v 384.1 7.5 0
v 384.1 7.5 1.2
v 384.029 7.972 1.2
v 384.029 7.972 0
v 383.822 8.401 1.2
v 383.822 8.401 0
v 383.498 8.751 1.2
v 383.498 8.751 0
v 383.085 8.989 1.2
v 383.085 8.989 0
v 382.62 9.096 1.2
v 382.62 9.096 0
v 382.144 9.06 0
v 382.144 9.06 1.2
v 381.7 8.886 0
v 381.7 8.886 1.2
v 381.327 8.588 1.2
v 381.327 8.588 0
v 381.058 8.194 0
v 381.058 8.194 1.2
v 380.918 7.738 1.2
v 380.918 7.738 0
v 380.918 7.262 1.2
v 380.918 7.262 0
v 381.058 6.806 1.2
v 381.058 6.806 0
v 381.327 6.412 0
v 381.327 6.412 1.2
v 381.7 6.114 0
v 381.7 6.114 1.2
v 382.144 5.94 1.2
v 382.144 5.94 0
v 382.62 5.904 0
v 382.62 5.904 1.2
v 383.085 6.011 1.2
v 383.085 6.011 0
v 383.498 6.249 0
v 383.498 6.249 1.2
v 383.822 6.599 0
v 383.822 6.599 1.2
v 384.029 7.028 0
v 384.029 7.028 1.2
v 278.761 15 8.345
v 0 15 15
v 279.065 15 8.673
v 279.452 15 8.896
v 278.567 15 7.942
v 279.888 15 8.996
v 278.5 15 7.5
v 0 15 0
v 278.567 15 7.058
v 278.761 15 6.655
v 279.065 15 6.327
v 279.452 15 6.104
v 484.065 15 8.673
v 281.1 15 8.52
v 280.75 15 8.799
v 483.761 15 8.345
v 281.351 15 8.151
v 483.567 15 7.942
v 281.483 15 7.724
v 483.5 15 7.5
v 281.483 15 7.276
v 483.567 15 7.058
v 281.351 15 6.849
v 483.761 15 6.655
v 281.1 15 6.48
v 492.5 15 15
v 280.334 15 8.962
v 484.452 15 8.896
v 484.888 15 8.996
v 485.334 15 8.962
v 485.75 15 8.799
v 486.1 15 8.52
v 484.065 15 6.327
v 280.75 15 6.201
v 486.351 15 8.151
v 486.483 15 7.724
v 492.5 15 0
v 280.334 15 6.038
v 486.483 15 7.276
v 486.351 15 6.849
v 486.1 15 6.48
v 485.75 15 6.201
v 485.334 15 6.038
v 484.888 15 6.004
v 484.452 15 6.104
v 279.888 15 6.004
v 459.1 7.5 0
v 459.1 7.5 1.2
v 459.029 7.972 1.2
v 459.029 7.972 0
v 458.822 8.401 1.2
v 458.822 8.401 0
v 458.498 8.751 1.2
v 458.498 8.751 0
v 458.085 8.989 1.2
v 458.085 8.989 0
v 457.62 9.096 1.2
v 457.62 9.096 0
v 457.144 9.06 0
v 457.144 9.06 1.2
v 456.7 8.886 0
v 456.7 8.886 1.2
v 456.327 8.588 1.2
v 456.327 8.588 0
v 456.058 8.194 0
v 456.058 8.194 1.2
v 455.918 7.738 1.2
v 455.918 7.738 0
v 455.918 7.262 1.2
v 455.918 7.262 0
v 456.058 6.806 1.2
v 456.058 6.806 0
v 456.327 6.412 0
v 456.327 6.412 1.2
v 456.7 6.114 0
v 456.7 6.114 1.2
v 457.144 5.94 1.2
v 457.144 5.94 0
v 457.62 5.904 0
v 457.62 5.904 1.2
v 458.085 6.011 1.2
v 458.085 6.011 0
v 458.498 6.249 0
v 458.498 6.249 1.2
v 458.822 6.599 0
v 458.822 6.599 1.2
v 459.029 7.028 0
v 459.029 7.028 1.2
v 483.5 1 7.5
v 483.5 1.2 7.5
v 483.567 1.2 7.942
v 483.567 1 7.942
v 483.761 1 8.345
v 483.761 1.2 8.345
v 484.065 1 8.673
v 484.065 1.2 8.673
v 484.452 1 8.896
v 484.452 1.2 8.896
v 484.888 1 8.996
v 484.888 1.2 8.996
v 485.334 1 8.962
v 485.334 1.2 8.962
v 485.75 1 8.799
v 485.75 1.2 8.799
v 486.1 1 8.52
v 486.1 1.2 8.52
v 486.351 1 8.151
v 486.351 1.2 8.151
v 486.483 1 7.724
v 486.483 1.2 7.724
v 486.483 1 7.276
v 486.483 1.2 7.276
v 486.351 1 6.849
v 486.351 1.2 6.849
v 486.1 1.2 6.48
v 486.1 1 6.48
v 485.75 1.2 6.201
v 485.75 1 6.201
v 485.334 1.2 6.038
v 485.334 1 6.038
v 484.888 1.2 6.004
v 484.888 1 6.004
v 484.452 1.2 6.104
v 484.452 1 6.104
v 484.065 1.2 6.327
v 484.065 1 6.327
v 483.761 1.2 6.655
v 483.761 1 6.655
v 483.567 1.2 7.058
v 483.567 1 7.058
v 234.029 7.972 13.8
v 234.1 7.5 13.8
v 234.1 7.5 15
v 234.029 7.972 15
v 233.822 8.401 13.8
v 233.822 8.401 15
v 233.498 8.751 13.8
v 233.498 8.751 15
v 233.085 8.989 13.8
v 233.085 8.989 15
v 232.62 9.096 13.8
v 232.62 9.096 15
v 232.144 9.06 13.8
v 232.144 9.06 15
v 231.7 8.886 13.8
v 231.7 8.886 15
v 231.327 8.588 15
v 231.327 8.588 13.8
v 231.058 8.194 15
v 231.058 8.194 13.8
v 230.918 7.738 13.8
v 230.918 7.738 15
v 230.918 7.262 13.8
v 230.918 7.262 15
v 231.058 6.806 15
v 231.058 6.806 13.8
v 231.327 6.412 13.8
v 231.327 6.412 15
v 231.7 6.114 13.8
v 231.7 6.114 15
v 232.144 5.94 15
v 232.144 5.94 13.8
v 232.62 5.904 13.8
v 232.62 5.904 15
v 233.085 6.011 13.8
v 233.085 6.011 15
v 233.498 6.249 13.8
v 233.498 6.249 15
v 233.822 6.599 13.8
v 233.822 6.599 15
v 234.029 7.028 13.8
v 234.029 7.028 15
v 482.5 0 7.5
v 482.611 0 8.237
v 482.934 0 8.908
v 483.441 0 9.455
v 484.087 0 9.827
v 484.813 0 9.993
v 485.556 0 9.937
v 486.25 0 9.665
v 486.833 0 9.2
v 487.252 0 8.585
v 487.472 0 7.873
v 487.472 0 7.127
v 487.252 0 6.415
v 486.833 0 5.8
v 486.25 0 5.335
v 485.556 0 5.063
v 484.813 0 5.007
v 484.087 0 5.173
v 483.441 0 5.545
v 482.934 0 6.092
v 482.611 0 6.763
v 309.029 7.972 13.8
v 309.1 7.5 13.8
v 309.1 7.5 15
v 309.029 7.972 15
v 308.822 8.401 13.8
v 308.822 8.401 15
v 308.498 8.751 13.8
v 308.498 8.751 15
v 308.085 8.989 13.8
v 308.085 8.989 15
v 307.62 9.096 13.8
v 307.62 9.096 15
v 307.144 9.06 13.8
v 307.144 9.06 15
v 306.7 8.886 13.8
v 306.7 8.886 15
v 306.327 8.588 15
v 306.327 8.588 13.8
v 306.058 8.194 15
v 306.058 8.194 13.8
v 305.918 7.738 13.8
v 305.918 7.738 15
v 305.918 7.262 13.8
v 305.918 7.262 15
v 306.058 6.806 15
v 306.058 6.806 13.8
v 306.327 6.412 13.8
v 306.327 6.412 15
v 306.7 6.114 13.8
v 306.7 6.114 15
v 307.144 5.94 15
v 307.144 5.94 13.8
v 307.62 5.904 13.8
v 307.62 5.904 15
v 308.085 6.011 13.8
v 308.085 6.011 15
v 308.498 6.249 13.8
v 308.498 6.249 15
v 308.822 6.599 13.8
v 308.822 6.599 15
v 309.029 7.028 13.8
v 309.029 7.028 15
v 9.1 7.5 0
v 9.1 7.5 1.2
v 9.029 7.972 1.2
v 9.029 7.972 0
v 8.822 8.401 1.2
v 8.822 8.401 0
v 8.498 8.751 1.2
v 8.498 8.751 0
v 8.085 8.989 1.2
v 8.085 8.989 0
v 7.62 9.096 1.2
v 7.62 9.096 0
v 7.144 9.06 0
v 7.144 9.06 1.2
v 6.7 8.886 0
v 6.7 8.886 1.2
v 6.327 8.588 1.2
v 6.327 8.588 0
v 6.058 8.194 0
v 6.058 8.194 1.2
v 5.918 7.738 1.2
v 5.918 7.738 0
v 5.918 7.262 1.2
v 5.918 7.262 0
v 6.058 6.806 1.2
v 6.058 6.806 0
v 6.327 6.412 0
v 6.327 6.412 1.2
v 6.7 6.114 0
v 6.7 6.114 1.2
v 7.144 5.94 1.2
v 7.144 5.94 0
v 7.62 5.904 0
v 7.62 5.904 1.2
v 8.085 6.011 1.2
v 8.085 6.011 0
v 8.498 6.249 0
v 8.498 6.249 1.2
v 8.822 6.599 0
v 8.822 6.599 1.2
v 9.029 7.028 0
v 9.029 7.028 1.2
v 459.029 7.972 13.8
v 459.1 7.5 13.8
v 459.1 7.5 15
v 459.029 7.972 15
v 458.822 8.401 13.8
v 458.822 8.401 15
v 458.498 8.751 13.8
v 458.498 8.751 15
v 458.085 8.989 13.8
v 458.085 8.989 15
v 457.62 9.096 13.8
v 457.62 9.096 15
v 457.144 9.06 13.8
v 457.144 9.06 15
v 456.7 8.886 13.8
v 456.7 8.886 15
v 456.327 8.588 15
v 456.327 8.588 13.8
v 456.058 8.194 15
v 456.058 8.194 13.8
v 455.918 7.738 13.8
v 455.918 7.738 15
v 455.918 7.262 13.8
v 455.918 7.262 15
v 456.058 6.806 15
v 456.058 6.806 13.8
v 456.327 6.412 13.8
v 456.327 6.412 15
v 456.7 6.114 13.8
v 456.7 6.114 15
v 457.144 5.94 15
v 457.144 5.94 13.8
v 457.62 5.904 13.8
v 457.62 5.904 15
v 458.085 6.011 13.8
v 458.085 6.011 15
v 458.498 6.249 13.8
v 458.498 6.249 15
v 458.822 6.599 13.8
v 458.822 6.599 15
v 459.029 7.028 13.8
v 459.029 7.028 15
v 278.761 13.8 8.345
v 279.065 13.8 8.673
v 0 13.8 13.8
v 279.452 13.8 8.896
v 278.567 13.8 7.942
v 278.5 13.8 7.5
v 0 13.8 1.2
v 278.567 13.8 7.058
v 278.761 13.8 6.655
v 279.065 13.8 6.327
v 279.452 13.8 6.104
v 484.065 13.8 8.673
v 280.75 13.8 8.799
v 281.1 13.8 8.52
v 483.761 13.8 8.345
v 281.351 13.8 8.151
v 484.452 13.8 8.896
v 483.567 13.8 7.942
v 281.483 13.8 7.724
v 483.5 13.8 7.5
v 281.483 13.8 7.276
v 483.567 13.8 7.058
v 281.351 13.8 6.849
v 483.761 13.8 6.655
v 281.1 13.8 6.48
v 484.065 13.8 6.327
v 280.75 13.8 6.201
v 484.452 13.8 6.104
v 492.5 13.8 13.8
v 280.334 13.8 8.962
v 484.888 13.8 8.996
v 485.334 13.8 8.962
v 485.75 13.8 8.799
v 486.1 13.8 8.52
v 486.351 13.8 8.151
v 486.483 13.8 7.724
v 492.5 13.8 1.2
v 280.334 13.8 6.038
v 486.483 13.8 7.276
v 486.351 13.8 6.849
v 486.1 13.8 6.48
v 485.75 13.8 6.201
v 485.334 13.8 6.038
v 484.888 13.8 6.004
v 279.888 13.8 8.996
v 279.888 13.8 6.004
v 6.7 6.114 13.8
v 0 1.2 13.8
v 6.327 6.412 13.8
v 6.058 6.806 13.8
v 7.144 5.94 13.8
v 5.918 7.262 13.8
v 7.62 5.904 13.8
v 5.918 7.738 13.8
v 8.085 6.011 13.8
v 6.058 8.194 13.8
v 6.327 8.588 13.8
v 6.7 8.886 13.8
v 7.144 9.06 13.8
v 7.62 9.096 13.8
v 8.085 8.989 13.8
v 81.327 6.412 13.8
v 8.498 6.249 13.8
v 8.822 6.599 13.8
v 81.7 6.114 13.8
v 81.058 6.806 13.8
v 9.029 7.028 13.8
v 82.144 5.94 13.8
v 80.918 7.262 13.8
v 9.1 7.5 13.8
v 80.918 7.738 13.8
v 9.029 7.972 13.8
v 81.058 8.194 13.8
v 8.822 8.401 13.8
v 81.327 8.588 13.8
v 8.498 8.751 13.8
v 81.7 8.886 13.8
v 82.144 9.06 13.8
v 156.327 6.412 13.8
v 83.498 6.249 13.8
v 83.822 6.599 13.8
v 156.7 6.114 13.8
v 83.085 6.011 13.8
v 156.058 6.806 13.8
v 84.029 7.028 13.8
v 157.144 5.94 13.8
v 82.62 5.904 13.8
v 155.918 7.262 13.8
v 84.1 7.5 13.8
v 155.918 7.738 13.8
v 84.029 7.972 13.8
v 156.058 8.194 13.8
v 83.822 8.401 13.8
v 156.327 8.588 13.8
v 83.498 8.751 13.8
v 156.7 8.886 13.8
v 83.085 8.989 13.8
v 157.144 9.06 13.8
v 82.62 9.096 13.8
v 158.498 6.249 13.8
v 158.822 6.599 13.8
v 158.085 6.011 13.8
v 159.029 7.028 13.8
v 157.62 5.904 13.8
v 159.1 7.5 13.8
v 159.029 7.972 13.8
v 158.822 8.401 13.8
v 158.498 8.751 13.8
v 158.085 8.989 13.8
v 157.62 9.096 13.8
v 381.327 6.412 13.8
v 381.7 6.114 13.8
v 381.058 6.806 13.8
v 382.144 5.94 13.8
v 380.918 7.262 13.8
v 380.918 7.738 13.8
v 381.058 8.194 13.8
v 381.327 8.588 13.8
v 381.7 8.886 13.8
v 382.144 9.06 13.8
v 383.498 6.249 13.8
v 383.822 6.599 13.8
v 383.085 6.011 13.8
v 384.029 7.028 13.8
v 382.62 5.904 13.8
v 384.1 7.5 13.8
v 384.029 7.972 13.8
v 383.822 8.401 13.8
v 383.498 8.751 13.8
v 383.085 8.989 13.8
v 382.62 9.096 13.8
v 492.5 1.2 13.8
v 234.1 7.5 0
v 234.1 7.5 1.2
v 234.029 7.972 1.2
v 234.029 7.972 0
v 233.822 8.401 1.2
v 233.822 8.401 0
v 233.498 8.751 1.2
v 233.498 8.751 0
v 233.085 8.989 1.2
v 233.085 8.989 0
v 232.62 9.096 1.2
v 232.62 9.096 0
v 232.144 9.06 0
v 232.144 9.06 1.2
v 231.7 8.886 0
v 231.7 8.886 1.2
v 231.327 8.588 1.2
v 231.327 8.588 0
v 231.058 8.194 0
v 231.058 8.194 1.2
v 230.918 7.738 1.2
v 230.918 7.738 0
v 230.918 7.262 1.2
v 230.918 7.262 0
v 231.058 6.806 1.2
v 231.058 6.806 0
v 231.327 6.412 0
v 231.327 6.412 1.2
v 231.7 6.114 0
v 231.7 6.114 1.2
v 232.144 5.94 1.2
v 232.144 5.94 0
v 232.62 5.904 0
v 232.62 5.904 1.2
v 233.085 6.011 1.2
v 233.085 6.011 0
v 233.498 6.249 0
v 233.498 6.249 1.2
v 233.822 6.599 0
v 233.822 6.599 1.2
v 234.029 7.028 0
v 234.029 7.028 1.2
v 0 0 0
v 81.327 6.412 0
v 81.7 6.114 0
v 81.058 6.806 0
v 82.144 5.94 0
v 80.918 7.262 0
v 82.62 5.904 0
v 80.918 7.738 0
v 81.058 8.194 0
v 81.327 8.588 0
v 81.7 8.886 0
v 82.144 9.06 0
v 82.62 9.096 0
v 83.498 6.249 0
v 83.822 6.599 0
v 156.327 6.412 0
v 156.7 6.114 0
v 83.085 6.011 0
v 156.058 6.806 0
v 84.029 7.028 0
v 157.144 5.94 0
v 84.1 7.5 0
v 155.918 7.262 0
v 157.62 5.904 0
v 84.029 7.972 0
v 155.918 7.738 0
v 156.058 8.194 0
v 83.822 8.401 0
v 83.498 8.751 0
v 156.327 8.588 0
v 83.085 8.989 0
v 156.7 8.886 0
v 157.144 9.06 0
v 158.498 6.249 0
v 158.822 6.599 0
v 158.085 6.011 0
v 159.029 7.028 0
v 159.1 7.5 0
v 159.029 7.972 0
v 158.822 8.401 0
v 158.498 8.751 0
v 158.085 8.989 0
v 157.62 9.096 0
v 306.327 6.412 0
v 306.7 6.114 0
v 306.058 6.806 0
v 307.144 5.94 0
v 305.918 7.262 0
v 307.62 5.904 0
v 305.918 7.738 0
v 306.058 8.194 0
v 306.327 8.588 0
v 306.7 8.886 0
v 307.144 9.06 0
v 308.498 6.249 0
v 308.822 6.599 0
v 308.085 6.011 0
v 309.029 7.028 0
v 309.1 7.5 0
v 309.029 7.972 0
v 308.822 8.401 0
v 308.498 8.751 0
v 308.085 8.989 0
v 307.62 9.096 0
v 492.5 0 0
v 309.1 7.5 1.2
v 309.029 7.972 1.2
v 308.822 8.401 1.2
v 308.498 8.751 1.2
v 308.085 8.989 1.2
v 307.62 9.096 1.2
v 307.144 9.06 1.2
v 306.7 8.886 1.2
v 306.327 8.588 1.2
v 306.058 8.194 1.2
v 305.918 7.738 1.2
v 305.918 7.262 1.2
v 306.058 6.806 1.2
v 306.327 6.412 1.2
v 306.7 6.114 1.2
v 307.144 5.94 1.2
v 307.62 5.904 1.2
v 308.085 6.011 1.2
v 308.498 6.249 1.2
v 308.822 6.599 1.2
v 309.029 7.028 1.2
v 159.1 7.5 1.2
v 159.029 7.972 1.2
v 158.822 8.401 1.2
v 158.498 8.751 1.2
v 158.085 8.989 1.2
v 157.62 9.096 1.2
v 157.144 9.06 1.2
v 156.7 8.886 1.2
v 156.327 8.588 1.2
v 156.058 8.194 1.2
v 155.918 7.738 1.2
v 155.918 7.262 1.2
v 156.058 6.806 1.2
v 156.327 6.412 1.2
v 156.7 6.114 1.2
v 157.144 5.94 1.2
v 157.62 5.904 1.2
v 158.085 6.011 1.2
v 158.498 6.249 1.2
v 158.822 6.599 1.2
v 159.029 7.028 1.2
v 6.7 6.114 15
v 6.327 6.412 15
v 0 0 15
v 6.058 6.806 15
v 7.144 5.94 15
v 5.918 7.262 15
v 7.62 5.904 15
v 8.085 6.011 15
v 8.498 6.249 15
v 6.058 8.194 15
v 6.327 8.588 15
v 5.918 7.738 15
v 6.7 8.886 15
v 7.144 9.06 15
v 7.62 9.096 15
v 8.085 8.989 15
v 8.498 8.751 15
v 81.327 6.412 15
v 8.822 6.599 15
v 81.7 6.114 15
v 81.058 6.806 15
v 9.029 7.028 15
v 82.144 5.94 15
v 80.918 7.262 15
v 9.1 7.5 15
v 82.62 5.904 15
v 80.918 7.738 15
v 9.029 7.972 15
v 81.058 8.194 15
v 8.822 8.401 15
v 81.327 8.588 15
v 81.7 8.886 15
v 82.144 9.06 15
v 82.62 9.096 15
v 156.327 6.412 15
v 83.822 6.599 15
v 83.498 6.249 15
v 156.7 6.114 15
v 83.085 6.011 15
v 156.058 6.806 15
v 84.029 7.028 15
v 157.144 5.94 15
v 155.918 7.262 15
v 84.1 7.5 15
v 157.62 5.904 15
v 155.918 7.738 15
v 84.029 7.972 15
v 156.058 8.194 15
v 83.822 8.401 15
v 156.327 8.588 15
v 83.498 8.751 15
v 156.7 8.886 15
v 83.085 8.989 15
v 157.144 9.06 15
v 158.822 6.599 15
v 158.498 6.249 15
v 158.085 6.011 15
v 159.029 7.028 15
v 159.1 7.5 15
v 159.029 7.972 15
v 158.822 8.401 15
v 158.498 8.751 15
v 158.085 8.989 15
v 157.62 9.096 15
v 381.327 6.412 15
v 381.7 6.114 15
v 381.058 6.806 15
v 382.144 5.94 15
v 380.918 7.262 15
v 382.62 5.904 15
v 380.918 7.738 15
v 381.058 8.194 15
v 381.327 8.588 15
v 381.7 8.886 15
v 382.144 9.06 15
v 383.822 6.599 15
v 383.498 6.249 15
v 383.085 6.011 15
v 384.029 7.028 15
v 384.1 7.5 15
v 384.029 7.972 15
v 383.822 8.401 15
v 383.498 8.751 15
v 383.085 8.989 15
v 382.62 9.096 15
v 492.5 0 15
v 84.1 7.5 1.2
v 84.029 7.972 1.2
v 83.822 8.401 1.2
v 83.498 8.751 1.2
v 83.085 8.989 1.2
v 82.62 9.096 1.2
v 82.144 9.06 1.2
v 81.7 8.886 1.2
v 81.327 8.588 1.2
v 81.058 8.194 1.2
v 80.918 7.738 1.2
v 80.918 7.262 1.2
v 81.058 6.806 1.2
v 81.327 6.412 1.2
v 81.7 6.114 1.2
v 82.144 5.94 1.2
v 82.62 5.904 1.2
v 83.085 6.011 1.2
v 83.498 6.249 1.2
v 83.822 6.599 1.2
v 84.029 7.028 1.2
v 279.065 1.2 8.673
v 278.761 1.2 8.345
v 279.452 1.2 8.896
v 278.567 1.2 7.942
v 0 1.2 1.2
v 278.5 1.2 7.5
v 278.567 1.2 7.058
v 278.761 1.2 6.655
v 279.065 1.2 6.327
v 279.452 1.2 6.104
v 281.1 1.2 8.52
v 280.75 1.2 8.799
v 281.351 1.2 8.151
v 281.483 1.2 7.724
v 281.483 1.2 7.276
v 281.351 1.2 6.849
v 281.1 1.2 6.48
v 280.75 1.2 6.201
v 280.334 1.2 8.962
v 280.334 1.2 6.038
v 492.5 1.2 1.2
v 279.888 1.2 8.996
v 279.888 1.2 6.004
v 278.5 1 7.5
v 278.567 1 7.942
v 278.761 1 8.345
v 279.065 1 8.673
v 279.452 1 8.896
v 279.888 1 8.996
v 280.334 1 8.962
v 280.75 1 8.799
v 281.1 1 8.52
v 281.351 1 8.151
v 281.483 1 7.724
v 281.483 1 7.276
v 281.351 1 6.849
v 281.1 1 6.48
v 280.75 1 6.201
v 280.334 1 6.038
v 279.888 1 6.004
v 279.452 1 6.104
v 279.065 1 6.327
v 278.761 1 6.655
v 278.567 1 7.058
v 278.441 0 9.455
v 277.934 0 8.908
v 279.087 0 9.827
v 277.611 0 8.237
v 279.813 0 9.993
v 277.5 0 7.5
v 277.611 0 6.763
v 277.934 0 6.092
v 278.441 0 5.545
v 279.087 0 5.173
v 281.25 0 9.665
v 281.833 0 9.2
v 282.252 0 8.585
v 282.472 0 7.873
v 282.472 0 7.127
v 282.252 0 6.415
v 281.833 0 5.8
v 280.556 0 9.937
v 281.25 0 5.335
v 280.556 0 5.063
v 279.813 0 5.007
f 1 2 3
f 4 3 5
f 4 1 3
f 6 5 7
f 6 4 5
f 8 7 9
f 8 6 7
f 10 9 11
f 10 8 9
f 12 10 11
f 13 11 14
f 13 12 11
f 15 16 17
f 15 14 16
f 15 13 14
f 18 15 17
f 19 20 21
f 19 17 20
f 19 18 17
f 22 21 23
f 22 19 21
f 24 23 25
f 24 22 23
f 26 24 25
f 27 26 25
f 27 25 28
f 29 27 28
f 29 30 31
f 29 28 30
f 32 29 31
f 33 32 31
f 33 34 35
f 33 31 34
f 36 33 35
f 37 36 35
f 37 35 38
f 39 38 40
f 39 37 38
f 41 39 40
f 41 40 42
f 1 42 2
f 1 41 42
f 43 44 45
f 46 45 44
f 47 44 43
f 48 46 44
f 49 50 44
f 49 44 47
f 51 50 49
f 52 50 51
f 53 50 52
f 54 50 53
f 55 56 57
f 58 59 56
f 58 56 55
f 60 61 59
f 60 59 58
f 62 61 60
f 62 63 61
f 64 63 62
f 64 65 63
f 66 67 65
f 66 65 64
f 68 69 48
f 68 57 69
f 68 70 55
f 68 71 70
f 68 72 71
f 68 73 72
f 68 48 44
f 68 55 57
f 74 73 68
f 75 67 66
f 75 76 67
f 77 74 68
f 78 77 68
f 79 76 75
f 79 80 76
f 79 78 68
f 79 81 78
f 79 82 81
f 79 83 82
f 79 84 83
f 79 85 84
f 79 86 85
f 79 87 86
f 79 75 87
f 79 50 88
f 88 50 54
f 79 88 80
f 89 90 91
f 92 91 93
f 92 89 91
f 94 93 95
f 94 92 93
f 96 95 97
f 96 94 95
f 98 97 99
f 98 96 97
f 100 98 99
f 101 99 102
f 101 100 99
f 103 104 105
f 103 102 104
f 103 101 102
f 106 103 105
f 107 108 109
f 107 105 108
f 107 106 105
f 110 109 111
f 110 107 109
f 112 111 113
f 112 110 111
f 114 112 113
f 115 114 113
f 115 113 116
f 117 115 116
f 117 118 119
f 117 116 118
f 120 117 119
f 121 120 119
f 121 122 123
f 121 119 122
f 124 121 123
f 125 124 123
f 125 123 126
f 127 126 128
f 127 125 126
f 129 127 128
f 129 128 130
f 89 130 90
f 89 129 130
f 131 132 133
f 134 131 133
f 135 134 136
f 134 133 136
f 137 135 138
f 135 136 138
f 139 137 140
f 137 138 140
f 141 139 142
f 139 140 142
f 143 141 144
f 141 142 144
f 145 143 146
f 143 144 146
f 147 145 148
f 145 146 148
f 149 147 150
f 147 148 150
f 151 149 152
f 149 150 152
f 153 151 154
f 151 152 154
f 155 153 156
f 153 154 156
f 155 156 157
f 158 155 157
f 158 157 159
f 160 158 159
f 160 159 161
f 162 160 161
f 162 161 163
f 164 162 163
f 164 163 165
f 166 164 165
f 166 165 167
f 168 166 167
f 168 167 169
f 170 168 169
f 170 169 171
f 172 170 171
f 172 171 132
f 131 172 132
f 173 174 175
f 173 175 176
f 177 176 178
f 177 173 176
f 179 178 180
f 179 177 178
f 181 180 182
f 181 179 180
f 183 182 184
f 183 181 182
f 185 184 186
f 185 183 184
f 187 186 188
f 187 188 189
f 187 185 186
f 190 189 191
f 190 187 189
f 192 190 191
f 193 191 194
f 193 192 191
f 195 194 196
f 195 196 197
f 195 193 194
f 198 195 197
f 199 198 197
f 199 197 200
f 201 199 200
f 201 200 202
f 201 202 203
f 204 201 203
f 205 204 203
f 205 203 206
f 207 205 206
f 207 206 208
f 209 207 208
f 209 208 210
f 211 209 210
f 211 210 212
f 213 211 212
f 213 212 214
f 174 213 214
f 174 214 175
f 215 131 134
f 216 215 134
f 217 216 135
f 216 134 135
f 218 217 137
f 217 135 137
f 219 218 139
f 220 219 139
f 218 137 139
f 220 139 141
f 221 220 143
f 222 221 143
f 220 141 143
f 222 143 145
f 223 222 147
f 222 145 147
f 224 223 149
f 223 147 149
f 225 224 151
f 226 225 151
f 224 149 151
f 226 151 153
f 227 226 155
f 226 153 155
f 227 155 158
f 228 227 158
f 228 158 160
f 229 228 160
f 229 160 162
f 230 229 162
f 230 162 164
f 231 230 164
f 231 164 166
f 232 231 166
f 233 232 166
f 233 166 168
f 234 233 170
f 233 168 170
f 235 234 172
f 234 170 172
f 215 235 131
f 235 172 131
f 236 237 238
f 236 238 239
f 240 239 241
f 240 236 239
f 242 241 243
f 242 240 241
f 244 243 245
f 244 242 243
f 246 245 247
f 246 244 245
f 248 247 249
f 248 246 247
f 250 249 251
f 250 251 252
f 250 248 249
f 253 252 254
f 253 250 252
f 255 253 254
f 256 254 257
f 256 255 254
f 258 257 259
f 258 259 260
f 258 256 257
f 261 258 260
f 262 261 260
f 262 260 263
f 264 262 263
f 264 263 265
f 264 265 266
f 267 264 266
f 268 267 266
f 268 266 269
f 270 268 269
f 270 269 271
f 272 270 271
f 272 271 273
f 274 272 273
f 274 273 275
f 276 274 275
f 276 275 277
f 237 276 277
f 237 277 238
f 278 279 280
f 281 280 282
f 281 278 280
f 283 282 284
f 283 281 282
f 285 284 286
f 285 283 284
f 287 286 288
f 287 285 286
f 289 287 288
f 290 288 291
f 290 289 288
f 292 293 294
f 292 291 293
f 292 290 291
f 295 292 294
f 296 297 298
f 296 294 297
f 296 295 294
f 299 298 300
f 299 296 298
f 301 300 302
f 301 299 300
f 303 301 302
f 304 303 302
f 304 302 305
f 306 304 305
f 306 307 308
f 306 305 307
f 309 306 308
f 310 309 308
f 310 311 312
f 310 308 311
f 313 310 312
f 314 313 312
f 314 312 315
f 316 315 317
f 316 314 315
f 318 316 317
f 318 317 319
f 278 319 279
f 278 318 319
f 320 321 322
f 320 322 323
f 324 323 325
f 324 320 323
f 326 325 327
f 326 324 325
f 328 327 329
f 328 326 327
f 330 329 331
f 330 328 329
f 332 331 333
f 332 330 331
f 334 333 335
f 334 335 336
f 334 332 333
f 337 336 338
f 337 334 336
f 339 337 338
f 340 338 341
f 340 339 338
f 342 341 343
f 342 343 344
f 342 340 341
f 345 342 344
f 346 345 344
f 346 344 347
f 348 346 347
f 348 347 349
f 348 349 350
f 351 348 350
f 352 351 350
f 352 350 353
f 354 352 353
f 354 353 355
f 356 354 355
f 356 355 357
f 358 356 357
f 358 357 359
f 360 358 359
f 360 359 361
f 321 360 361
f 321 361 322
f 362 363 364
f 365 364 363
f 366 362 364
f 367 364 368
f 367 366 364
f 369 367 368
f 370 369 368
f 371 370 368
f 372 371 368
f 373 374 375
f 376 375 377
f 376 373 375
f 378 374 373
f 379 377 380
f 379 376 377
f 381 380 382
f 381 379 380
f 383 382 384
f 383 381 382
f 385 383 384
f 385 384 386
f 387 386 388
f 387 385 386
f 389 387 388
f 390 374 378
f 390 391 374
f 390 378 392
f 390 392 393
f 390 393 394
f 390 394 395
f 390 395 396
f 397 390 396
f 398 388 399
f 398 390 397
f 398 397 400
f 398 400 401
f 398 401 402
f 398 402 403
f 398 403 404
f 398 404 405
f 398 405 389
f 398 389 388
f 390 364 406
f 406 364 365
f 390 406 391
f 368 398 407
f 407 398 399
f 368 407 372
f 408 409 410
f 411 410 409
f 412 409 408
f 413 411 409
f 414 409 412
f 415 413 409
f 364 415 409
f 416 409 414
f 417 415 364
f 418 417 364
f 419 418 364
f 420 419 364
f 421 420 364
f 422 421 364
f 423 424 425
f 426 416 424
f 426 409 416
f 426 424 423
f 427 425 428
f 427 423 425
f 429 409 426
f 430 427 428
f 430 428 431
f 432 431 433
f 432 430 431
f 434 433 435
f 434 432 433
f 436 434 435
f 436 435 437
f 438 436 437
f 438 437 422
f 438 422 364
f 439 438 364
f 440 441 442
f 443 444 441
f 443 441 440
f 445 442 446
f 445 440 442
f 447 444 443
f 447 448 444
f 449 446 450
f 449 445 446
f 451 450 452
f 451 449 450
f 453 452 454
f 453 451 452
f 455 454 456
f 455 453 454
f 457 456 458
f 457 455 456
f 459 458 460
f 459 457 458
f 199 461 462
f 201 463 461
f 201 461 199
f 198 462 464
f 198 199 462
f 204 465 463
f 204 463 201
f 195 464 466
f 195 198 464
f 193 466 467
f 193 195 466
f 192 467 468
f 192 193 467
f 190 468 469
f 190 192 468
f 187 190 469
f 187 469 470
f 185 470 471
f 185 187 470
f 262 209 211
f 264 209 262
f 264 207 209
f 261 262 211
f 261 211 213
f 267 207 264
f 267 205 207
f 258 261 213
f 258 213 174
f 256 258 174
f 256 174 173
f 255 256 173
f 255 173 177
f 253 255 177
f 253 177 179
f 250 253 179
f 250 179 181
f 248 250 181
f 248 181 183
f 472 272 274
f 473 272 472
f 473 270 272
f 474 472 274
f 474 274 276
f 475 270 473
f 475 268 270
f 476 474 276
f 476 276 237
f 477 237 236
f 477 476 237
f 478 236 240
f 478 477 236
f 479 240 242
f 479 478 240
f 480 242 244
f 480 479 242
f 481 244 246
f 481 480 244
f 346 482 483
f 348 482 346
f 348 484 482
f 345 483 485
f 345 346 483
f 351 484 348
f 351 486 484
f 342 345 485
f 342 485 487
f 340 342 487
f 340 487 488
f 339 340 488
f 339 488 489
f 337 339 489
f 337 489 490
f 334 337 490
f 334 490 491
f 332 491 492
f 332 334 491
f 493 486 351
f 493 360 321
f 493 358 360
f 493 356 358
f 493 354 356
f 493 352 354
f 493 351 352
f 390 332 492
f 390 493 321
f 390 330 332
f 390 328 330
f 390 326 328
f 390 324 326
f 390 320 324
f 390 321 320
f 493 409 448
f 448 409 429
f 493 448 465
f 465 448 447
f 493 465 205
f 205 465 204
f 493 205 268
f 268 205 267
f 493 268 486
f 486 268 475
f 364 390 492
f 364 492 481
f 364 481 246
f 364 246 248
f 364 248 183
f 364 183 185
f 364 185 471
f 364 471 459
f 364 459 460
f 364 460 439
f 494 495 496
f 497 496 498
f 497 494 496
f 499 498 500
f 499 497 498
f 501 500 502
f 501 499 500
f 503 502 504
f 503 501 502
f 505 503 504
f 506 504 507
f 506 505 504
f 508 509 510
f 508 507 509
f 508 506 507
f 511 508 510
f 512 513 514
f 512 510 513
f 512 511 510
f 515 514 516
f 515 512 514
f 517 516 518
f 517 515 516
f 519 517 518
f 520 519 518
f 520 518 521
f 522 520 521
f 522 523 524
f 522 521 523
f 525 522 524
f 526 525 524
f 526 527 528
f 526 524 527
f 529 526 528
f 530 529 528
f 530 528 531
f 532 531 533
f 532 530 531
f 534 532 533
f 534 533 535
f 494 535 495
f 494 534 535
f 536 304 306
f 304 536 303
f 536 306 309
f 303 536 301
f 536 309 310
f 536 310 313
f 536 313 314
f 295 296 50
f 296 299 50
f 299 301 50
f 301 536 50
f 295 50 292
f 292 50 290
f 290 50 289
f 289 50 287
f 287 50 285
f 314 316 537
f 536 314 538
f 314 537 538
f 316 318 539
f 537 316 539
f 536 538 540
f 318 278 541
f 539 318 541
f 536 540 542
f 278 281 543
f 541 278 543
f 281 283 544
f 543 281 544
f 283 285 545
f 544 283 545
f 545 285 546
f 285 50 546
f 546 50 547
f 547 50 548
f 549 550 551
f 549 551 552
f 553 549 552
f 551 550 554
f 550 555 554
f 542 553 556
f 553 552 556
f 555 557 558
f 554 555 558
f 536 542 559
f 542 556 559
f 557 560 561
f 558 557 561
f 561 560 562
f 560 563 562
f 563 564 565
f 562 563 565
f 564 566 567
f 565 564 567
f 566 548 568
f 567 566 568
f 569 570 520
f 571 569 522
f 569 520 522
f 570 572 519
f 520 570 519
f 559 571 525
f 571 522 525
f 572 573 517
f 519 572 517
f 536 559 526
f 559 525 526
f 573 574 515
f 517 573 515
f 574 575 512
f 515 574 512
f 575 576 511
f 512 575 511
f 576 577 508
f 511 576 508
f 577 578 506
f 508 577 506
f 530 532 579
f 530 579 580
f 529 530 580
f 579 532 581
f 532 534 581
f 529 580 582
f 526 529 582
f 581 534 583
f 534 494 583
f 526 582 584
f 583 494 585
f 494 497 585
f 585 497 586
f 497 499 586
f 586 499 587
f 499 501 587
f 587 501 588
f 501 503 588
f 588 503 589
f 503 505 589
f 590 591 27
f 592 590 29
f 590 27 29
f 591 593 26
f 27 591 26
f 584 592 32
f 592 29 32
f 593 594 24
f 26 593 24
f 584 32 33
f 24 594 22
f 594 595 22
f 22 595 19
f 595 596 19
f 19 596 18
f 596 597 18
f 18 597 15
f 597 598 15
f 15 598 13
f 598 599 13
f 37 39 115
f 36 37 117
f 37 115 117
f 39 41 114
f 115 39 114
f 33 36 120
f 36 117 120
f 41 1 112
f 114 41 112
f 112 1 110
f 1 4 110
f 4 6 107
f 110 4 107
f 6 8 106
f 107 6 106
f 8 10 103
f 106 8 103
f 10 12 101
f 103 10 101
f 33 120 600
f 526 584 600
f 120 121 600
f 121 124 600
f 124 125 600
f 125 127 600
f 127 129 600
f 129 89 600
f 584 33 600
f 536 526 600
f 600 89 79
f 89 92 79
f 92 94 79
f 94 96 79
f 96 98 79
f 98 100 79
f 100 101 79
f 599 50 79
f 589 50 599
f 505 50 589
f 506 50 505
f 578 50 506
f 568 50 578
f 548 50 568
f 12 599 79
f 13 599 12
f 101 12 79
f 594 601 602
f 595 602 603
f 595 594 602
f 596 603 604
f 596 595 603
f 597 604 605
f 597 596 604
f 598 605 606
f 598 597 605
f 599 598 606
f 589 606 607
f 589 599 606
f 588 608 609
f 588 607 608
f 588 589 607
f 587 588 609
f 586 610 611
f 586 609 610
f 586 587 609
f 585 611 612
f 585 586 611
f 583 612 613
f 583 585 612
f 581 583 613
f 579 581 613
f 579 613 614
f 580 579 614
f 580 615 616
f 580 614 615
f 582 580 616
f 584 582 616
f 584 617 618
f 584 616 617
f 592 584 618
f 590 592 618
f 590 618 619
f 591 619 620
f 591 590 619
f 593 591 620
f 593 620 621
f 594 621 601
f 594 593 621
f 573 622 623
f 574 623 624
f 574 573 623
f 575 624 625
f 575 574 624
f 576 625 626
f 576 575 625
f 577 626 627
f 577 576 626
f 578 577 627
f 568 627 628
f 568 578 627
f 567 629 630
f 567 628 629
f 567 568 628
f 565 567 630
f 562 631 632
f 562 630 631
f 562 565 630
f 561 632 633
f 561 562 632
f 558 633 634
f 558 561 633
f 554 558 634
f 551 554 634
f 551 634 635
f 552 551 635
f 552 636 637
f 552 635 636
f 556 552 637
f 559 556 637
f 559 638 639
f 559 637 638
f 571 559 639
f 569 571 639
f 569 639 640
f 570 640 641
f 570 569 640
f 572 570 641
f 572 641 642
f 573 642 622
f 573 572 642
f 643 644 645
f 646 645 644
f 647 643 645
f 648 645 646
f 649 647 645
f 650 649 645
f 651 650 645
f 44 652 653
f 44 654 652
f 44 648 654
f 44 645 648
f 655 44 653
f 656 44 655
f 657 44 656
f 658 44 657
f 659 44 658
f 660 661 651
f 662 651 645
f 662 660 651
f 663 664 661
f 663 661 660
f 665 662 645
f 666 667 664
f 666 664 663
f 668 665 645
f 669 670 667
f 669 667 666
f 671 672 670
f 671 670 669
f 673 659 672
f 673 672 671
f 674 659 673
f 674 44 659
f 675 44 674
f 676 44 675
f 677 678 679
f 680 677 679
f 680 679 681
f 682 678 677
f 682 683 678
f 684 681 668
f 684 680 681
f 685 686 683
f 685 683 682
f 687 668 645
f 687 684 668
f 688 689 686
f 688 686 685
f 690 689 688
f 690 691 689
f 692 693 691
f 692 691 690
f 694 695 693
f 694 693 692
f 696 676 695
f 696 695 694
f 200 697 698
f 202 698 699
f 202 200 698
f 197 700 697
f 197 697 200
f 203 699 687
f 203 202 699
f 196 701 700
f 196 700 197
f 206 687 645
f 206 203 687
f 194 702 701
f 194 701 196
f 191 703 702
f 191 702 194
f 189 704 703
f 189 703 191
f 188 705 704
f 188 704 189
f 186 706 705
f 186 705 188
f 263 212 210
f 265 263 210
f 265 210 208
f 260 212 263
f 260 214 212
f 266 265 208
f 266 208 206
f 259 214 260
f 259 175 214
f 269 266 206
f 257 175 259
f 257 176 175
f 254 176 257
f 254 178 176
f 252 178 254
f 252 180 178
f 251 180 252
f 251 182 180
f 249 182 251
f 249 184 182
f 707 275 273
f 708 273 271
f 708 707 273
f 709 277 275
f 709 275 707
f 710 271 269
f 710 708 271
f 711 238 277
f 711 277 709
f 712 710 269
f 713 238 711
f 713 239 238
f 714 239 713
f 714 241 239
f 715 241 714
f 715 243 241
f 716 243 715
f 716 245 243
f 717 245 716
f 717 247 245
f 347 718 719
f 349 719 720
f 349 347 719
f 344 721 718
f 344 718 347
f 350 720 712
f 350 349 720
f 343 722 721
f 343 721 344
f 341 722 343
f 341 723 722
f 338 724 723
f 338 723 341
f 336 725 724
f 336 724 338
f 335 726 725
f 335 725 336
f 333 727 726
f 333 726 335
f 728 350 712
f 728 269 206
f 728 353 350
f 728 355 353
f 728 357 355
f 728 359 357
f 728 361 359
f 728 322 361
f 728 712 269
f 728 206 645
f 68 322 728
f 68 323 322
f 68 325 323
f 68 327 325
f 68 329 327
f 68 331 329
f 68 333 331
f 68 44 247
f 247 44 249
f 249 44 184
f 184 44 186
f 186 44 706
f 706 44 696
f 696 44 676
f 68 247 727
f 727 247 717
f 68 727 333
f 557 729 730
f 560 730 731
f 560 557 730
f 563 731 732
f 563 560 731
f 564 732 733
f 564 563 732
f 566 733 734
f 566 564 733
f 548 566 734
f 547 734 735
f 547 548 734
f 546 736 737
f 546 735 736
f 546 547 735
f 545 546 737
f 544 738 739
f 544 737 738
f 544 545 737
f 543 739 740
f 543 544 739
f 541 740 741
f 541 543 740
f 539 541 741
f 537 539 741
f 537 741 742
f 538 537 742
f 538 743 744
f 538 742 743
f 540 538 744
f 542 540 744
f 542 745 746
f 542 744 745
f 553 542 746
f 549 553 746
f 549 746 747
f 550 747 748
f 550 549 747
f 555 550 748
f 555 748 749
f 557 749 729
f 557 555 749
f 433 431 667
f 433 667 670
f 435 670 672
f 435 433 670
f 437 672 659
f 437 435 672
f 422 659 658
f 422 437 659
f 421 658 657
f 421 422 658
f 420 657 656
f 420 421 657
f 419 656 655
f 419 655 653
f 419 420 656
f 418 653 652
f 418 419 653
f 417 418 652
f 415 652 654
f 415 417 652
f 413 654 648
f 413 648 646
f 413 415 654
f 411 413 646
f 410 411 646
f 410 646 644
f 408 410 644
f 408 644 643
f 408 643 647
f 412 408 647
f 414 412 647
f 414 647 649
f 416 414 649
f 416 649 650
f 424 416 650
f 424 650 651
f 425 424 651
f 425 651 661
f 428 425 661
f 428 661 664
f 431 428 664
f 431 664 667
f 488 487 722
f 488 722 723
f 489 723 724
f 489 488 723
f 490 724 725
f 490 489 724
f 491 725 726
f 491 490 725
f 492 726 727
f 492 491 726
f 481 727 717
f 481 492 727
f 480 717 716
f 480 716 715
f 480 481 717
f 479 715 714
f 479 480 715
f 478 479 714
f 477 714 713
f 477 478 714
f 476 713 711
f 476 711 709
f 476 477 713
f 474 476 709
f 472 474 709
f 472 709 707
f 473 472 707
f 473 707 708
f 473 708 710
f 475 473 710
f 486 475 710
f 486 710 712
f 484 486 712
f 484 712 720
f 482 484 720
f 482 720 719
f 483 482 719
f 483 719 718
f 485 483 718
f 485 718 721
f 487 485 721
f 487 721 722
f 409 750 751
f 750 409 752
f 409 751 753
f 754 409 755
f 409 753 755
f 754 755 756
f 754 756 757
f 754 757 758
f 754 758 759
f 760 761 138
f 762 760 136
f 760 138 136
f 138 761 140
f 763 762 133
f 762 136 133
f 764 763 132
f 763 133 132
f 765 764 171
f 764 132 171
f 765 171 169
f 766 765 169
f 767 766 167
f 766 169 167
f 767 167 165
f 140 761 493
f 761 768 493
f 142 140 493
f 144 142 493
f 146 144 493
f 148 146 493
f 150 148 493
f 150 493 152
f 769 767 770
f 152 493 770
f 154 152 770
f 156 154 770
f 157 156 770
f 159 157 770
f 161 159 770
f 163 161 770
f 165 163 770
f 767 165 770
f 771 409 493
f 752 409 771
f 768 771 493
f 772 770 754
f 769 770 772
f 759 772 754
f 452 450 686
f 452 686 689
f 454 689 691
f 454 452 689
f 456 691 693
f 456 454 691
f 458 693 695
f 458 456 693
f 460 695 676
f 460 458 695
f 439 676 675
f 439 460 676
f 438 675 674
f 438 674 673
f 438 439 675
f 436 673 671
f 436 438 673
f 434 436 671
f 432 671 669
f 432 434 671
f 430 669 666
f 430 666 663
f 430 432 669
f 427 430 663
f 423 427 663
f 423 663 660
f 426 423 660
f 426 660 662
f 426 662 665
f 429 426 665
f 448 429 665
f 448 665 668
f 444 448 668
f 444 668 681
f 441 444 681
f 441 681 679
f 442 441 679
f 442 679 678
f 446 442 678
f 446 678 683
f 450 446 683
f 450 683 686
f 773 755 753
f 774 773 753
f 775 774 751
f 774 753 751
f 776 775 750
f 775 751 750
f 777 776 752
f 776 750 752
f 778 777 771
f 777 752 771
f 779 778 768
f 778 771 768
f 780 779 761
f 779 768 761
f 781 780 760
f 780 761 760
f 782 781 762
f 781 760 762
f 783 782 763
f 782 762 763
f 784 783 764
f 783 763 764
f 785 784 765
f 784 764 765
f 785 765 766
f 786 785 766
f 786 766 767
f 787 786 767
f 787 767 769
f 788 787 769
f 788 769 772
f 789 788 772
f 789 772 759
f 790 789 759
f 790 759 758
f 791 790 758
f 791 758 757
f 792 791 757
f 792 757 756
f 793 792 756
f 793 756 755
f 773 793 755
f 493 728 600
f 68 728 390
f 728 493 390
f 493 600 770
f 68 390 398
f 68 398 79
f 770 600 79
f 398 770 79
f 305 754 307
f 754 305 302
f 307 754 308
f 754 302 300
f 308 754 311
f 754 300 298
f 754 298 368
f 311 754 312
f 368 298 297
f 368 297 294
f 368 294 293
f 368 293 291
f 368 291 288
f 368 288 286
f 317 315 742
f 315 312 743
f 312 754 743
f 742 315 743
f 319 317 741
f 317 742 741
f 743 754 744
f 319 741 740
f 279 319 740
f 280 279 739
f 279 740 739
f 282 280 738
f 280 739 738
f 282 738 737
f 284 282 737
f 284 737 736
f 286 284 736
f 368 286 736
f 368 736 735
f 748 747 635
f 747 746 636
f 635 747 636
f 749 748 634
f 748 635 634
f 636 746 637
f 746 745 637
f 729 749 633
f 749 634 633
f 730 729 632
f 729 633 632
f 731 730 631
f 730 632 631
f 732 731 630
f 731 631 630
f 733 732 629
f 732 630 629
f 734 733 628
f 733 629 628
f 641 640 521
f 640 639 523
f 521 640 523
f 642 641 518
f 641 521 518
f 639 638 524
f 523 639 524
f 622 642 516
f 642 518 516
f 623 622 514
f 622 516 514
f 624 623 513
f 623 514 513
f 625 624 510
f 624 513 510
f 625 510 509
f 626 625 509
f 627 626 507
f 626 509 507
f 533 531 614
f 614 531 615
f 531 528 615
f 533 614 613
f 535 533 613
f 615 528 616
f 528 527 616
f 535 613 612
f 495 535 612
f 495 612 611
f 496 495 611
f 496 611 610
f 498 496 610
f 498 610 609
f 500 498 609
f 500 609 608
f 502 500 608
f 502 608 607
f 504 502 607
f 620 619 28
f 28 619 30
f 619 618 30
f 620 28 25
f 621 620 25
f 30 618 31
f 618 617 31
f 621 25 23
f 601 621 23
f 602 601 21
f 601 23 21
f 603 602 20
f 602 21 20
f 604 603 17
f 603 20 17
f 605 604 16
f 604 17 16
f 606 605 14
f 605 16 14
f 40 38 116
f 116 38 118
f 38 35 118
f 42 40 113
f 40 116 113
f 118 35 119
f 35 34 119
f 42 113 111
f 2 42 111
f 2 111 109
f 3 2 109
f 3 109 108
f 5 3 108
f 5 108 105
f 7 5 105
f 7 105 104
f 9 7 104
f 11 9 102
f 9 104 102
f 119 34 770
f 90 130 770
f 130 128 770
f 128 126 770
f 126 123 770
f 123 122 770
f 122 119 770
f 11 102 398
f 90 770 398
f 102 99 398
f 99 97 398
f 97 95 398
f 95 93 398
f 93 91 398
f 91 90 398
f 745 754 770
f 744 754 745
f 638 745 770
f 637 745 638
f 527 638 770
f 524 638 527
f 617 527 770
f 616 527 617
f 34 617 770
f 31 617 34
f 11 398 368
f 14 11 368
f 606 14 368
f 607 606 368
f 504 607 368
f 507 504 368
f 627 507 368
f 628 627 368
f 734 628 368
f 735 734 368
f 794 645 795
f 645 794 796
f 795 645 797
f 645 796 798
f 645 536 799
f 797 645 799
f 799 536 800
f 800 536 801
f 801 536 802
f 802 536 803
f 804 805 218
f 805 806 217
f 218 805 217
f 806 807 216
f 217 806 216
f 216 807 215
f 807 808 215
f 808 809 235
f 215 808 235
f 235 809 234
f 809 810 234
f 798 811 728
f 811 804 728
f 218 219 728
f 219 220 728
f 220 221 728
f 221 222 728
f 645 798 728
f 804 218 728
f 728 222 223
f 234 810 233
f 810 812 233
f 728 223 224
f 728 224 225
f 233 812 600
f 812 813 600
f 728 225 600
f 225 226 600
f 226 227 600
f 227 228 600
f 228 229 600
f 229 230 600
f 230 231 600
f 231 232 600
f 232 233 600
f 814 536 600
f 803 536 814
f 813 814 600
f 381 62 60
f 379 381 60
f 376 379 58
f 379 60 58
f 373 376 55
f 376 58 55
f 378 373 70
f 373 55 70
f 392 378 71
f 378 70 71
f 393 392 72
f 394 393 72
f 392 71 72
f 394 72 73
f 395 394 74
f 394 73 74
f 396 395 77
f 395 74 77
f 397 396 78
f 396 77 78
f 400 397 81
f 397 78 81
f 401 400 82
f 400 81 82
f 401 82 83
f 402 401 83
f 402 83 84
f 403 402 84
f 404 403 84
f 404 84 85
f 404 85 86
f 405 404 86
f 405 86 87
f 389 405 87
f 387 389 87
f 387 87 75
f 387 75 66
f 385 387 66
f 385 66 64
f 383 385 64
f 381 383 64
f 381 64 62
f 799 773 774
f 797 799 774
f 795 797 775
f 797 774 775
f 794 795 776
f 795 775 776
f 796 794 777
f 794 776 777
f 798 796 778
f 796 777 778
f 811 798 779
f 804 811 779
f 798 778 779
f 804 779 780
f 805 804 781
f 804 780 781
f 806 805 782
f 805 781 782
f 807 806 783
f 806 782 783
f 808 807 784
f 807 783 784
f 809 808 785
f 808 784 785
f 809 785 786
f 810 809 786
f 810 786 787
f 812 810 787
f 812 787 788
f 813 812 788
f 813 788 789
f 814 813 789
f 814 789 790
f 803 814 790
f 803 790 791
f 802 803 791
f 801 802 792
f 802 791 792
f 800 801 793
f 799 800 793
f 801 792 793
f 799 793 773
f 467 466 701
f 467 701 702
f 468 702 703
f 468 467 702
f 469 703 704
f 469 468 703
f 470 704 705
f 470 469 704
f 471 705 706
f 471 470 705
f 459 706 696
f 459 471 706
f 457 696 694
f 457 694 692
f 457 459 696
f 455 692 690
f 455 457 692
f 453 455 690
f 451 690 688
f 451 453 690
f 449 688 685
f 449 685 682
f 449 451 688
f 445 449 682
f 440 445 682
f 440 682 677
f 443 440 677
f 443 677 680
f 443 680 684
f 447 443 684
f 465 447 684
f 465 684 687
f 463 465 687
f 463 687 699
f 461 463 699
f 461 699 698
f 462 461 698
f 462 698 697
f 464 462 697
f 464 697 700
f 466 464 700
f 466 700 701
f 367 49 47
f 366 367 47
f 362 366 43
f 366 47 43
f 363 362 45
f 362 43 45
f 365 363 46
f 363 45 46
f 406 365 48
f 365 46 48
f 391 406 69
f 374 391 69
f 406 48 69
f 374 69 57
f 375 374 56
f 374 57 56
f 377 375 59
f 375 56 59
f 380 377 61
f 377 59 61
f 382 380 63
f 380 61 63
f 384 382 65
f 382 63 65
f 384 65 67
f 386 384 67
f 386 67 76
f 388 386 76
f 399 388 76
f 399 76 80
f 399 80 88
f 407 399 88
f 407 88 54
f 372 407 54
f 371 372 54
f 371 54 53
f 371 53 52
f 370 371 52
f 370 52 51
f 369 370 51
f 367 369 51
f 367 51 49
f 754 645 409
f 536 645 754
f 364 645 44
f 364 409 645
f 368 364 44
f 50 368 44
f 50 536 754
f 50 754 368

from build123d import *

# Parameters (mm, degrees)
SKETCH_2_W          = 492.5
SKETCH_2_H          = 15
SKETCH_2_R          = 1.6
EXTRUDE_1_DEPTH     = 15
SKETCH_3_W          = 12.6
SKETCH_3_H          = 12.6
CUT_EXTRUDE_1_DEPTH = 493.956641095
SKETCH_4_R          = 1.5
CUT_EXTRUDE_2_DEPTH = 493.956641095
CHAMFER_1_SIZE      = 1


with BuildPart() as part:
    # ｽｹｯﾁ2 → ﾎﾞｽ - 押し出し1 (new body)
    with BuildSketch(Plane.XY):
        with Locations((246.25, 7.5)):
            Rectangle(SKETCH_2_W, SKETCH_2_H)
        with Locations((7.5, 7.5)):
            Circle(SKETCH_2_R, mode=Mode.SUBTRACT)
        with Locations((457.5, 7.5)):
            Circle(SKETCH_2_R, mode=Mode.SUBTRACT)
        with Locations((232.5, 7.5)):
            Circle(SKETCH_2_R, mode=Mode.SUBTRACT)
        with Locations((82.5, 7.5)):
            Circle(SKETCH_2_R, mode=Mode.SUBTRACT)
        with Locations((157.5, 7.5)):
            Circle(SKETCH_2_R, mode=Mode.SUBTRACT)
        with Locations((307.5, 7.5)):
            Circle(SKETCH_2_R, mode=Mode.SUBTRACT)
        with Locations((382.5, 7.5)):
            Circle(SKETCH_2_R, mode=Mode.SUBTRACT)
    extrude(amount=EXTRUDE_1_DEPTH)

    # ｽｹｯﾁ3 → ｶｯﾄ - 押し出し1 (cut, through all)
    with BuildSketch(Plane(origin=(492.5, 0, 0), x_dir=(0, 0, -1), z_dir=(1, 0, 0))):
        with Locations((-7.5, 7.5)):
            Rectangle(SKETCH_3_W, SKETCH_3_H)
    extrude(amount=-CUT_EXTRUDE_1_DEPTH, mode=Mode.SUBTRACT)

    # ｽｹｯﾁ4 → ｶｯﾄ - 押し出し2 (cut, through all)
    with BuildSketch(Plane(origin=(0, 15, 0), x_dir=(1, 0, 0), z_dir=(0, 1, 0))):
        with Locations(Location((280, -7.5, 0), (0, 0, 180))):
            Circle(SKETCH_4_R)
        with Locations(Location((485, -7.5, 0), (0, 0, 180))):
            Circle(SKETCH_4_R)
    extrude(amount=-CUT_EXTRUDE_2_DEPTH, mode=Mode.SUBTRACT)

    # 面取り1
    chamfer_1_edges = [part.edges().sort_by_distance(p)[0] for p in [
        (281.5, 0, 7.5),
        (486.5, 0, 7.5),
    ]]
    chamfer(chamfer_1_edges, length=CHAMFER_1_SIZE)


solid = part.part
